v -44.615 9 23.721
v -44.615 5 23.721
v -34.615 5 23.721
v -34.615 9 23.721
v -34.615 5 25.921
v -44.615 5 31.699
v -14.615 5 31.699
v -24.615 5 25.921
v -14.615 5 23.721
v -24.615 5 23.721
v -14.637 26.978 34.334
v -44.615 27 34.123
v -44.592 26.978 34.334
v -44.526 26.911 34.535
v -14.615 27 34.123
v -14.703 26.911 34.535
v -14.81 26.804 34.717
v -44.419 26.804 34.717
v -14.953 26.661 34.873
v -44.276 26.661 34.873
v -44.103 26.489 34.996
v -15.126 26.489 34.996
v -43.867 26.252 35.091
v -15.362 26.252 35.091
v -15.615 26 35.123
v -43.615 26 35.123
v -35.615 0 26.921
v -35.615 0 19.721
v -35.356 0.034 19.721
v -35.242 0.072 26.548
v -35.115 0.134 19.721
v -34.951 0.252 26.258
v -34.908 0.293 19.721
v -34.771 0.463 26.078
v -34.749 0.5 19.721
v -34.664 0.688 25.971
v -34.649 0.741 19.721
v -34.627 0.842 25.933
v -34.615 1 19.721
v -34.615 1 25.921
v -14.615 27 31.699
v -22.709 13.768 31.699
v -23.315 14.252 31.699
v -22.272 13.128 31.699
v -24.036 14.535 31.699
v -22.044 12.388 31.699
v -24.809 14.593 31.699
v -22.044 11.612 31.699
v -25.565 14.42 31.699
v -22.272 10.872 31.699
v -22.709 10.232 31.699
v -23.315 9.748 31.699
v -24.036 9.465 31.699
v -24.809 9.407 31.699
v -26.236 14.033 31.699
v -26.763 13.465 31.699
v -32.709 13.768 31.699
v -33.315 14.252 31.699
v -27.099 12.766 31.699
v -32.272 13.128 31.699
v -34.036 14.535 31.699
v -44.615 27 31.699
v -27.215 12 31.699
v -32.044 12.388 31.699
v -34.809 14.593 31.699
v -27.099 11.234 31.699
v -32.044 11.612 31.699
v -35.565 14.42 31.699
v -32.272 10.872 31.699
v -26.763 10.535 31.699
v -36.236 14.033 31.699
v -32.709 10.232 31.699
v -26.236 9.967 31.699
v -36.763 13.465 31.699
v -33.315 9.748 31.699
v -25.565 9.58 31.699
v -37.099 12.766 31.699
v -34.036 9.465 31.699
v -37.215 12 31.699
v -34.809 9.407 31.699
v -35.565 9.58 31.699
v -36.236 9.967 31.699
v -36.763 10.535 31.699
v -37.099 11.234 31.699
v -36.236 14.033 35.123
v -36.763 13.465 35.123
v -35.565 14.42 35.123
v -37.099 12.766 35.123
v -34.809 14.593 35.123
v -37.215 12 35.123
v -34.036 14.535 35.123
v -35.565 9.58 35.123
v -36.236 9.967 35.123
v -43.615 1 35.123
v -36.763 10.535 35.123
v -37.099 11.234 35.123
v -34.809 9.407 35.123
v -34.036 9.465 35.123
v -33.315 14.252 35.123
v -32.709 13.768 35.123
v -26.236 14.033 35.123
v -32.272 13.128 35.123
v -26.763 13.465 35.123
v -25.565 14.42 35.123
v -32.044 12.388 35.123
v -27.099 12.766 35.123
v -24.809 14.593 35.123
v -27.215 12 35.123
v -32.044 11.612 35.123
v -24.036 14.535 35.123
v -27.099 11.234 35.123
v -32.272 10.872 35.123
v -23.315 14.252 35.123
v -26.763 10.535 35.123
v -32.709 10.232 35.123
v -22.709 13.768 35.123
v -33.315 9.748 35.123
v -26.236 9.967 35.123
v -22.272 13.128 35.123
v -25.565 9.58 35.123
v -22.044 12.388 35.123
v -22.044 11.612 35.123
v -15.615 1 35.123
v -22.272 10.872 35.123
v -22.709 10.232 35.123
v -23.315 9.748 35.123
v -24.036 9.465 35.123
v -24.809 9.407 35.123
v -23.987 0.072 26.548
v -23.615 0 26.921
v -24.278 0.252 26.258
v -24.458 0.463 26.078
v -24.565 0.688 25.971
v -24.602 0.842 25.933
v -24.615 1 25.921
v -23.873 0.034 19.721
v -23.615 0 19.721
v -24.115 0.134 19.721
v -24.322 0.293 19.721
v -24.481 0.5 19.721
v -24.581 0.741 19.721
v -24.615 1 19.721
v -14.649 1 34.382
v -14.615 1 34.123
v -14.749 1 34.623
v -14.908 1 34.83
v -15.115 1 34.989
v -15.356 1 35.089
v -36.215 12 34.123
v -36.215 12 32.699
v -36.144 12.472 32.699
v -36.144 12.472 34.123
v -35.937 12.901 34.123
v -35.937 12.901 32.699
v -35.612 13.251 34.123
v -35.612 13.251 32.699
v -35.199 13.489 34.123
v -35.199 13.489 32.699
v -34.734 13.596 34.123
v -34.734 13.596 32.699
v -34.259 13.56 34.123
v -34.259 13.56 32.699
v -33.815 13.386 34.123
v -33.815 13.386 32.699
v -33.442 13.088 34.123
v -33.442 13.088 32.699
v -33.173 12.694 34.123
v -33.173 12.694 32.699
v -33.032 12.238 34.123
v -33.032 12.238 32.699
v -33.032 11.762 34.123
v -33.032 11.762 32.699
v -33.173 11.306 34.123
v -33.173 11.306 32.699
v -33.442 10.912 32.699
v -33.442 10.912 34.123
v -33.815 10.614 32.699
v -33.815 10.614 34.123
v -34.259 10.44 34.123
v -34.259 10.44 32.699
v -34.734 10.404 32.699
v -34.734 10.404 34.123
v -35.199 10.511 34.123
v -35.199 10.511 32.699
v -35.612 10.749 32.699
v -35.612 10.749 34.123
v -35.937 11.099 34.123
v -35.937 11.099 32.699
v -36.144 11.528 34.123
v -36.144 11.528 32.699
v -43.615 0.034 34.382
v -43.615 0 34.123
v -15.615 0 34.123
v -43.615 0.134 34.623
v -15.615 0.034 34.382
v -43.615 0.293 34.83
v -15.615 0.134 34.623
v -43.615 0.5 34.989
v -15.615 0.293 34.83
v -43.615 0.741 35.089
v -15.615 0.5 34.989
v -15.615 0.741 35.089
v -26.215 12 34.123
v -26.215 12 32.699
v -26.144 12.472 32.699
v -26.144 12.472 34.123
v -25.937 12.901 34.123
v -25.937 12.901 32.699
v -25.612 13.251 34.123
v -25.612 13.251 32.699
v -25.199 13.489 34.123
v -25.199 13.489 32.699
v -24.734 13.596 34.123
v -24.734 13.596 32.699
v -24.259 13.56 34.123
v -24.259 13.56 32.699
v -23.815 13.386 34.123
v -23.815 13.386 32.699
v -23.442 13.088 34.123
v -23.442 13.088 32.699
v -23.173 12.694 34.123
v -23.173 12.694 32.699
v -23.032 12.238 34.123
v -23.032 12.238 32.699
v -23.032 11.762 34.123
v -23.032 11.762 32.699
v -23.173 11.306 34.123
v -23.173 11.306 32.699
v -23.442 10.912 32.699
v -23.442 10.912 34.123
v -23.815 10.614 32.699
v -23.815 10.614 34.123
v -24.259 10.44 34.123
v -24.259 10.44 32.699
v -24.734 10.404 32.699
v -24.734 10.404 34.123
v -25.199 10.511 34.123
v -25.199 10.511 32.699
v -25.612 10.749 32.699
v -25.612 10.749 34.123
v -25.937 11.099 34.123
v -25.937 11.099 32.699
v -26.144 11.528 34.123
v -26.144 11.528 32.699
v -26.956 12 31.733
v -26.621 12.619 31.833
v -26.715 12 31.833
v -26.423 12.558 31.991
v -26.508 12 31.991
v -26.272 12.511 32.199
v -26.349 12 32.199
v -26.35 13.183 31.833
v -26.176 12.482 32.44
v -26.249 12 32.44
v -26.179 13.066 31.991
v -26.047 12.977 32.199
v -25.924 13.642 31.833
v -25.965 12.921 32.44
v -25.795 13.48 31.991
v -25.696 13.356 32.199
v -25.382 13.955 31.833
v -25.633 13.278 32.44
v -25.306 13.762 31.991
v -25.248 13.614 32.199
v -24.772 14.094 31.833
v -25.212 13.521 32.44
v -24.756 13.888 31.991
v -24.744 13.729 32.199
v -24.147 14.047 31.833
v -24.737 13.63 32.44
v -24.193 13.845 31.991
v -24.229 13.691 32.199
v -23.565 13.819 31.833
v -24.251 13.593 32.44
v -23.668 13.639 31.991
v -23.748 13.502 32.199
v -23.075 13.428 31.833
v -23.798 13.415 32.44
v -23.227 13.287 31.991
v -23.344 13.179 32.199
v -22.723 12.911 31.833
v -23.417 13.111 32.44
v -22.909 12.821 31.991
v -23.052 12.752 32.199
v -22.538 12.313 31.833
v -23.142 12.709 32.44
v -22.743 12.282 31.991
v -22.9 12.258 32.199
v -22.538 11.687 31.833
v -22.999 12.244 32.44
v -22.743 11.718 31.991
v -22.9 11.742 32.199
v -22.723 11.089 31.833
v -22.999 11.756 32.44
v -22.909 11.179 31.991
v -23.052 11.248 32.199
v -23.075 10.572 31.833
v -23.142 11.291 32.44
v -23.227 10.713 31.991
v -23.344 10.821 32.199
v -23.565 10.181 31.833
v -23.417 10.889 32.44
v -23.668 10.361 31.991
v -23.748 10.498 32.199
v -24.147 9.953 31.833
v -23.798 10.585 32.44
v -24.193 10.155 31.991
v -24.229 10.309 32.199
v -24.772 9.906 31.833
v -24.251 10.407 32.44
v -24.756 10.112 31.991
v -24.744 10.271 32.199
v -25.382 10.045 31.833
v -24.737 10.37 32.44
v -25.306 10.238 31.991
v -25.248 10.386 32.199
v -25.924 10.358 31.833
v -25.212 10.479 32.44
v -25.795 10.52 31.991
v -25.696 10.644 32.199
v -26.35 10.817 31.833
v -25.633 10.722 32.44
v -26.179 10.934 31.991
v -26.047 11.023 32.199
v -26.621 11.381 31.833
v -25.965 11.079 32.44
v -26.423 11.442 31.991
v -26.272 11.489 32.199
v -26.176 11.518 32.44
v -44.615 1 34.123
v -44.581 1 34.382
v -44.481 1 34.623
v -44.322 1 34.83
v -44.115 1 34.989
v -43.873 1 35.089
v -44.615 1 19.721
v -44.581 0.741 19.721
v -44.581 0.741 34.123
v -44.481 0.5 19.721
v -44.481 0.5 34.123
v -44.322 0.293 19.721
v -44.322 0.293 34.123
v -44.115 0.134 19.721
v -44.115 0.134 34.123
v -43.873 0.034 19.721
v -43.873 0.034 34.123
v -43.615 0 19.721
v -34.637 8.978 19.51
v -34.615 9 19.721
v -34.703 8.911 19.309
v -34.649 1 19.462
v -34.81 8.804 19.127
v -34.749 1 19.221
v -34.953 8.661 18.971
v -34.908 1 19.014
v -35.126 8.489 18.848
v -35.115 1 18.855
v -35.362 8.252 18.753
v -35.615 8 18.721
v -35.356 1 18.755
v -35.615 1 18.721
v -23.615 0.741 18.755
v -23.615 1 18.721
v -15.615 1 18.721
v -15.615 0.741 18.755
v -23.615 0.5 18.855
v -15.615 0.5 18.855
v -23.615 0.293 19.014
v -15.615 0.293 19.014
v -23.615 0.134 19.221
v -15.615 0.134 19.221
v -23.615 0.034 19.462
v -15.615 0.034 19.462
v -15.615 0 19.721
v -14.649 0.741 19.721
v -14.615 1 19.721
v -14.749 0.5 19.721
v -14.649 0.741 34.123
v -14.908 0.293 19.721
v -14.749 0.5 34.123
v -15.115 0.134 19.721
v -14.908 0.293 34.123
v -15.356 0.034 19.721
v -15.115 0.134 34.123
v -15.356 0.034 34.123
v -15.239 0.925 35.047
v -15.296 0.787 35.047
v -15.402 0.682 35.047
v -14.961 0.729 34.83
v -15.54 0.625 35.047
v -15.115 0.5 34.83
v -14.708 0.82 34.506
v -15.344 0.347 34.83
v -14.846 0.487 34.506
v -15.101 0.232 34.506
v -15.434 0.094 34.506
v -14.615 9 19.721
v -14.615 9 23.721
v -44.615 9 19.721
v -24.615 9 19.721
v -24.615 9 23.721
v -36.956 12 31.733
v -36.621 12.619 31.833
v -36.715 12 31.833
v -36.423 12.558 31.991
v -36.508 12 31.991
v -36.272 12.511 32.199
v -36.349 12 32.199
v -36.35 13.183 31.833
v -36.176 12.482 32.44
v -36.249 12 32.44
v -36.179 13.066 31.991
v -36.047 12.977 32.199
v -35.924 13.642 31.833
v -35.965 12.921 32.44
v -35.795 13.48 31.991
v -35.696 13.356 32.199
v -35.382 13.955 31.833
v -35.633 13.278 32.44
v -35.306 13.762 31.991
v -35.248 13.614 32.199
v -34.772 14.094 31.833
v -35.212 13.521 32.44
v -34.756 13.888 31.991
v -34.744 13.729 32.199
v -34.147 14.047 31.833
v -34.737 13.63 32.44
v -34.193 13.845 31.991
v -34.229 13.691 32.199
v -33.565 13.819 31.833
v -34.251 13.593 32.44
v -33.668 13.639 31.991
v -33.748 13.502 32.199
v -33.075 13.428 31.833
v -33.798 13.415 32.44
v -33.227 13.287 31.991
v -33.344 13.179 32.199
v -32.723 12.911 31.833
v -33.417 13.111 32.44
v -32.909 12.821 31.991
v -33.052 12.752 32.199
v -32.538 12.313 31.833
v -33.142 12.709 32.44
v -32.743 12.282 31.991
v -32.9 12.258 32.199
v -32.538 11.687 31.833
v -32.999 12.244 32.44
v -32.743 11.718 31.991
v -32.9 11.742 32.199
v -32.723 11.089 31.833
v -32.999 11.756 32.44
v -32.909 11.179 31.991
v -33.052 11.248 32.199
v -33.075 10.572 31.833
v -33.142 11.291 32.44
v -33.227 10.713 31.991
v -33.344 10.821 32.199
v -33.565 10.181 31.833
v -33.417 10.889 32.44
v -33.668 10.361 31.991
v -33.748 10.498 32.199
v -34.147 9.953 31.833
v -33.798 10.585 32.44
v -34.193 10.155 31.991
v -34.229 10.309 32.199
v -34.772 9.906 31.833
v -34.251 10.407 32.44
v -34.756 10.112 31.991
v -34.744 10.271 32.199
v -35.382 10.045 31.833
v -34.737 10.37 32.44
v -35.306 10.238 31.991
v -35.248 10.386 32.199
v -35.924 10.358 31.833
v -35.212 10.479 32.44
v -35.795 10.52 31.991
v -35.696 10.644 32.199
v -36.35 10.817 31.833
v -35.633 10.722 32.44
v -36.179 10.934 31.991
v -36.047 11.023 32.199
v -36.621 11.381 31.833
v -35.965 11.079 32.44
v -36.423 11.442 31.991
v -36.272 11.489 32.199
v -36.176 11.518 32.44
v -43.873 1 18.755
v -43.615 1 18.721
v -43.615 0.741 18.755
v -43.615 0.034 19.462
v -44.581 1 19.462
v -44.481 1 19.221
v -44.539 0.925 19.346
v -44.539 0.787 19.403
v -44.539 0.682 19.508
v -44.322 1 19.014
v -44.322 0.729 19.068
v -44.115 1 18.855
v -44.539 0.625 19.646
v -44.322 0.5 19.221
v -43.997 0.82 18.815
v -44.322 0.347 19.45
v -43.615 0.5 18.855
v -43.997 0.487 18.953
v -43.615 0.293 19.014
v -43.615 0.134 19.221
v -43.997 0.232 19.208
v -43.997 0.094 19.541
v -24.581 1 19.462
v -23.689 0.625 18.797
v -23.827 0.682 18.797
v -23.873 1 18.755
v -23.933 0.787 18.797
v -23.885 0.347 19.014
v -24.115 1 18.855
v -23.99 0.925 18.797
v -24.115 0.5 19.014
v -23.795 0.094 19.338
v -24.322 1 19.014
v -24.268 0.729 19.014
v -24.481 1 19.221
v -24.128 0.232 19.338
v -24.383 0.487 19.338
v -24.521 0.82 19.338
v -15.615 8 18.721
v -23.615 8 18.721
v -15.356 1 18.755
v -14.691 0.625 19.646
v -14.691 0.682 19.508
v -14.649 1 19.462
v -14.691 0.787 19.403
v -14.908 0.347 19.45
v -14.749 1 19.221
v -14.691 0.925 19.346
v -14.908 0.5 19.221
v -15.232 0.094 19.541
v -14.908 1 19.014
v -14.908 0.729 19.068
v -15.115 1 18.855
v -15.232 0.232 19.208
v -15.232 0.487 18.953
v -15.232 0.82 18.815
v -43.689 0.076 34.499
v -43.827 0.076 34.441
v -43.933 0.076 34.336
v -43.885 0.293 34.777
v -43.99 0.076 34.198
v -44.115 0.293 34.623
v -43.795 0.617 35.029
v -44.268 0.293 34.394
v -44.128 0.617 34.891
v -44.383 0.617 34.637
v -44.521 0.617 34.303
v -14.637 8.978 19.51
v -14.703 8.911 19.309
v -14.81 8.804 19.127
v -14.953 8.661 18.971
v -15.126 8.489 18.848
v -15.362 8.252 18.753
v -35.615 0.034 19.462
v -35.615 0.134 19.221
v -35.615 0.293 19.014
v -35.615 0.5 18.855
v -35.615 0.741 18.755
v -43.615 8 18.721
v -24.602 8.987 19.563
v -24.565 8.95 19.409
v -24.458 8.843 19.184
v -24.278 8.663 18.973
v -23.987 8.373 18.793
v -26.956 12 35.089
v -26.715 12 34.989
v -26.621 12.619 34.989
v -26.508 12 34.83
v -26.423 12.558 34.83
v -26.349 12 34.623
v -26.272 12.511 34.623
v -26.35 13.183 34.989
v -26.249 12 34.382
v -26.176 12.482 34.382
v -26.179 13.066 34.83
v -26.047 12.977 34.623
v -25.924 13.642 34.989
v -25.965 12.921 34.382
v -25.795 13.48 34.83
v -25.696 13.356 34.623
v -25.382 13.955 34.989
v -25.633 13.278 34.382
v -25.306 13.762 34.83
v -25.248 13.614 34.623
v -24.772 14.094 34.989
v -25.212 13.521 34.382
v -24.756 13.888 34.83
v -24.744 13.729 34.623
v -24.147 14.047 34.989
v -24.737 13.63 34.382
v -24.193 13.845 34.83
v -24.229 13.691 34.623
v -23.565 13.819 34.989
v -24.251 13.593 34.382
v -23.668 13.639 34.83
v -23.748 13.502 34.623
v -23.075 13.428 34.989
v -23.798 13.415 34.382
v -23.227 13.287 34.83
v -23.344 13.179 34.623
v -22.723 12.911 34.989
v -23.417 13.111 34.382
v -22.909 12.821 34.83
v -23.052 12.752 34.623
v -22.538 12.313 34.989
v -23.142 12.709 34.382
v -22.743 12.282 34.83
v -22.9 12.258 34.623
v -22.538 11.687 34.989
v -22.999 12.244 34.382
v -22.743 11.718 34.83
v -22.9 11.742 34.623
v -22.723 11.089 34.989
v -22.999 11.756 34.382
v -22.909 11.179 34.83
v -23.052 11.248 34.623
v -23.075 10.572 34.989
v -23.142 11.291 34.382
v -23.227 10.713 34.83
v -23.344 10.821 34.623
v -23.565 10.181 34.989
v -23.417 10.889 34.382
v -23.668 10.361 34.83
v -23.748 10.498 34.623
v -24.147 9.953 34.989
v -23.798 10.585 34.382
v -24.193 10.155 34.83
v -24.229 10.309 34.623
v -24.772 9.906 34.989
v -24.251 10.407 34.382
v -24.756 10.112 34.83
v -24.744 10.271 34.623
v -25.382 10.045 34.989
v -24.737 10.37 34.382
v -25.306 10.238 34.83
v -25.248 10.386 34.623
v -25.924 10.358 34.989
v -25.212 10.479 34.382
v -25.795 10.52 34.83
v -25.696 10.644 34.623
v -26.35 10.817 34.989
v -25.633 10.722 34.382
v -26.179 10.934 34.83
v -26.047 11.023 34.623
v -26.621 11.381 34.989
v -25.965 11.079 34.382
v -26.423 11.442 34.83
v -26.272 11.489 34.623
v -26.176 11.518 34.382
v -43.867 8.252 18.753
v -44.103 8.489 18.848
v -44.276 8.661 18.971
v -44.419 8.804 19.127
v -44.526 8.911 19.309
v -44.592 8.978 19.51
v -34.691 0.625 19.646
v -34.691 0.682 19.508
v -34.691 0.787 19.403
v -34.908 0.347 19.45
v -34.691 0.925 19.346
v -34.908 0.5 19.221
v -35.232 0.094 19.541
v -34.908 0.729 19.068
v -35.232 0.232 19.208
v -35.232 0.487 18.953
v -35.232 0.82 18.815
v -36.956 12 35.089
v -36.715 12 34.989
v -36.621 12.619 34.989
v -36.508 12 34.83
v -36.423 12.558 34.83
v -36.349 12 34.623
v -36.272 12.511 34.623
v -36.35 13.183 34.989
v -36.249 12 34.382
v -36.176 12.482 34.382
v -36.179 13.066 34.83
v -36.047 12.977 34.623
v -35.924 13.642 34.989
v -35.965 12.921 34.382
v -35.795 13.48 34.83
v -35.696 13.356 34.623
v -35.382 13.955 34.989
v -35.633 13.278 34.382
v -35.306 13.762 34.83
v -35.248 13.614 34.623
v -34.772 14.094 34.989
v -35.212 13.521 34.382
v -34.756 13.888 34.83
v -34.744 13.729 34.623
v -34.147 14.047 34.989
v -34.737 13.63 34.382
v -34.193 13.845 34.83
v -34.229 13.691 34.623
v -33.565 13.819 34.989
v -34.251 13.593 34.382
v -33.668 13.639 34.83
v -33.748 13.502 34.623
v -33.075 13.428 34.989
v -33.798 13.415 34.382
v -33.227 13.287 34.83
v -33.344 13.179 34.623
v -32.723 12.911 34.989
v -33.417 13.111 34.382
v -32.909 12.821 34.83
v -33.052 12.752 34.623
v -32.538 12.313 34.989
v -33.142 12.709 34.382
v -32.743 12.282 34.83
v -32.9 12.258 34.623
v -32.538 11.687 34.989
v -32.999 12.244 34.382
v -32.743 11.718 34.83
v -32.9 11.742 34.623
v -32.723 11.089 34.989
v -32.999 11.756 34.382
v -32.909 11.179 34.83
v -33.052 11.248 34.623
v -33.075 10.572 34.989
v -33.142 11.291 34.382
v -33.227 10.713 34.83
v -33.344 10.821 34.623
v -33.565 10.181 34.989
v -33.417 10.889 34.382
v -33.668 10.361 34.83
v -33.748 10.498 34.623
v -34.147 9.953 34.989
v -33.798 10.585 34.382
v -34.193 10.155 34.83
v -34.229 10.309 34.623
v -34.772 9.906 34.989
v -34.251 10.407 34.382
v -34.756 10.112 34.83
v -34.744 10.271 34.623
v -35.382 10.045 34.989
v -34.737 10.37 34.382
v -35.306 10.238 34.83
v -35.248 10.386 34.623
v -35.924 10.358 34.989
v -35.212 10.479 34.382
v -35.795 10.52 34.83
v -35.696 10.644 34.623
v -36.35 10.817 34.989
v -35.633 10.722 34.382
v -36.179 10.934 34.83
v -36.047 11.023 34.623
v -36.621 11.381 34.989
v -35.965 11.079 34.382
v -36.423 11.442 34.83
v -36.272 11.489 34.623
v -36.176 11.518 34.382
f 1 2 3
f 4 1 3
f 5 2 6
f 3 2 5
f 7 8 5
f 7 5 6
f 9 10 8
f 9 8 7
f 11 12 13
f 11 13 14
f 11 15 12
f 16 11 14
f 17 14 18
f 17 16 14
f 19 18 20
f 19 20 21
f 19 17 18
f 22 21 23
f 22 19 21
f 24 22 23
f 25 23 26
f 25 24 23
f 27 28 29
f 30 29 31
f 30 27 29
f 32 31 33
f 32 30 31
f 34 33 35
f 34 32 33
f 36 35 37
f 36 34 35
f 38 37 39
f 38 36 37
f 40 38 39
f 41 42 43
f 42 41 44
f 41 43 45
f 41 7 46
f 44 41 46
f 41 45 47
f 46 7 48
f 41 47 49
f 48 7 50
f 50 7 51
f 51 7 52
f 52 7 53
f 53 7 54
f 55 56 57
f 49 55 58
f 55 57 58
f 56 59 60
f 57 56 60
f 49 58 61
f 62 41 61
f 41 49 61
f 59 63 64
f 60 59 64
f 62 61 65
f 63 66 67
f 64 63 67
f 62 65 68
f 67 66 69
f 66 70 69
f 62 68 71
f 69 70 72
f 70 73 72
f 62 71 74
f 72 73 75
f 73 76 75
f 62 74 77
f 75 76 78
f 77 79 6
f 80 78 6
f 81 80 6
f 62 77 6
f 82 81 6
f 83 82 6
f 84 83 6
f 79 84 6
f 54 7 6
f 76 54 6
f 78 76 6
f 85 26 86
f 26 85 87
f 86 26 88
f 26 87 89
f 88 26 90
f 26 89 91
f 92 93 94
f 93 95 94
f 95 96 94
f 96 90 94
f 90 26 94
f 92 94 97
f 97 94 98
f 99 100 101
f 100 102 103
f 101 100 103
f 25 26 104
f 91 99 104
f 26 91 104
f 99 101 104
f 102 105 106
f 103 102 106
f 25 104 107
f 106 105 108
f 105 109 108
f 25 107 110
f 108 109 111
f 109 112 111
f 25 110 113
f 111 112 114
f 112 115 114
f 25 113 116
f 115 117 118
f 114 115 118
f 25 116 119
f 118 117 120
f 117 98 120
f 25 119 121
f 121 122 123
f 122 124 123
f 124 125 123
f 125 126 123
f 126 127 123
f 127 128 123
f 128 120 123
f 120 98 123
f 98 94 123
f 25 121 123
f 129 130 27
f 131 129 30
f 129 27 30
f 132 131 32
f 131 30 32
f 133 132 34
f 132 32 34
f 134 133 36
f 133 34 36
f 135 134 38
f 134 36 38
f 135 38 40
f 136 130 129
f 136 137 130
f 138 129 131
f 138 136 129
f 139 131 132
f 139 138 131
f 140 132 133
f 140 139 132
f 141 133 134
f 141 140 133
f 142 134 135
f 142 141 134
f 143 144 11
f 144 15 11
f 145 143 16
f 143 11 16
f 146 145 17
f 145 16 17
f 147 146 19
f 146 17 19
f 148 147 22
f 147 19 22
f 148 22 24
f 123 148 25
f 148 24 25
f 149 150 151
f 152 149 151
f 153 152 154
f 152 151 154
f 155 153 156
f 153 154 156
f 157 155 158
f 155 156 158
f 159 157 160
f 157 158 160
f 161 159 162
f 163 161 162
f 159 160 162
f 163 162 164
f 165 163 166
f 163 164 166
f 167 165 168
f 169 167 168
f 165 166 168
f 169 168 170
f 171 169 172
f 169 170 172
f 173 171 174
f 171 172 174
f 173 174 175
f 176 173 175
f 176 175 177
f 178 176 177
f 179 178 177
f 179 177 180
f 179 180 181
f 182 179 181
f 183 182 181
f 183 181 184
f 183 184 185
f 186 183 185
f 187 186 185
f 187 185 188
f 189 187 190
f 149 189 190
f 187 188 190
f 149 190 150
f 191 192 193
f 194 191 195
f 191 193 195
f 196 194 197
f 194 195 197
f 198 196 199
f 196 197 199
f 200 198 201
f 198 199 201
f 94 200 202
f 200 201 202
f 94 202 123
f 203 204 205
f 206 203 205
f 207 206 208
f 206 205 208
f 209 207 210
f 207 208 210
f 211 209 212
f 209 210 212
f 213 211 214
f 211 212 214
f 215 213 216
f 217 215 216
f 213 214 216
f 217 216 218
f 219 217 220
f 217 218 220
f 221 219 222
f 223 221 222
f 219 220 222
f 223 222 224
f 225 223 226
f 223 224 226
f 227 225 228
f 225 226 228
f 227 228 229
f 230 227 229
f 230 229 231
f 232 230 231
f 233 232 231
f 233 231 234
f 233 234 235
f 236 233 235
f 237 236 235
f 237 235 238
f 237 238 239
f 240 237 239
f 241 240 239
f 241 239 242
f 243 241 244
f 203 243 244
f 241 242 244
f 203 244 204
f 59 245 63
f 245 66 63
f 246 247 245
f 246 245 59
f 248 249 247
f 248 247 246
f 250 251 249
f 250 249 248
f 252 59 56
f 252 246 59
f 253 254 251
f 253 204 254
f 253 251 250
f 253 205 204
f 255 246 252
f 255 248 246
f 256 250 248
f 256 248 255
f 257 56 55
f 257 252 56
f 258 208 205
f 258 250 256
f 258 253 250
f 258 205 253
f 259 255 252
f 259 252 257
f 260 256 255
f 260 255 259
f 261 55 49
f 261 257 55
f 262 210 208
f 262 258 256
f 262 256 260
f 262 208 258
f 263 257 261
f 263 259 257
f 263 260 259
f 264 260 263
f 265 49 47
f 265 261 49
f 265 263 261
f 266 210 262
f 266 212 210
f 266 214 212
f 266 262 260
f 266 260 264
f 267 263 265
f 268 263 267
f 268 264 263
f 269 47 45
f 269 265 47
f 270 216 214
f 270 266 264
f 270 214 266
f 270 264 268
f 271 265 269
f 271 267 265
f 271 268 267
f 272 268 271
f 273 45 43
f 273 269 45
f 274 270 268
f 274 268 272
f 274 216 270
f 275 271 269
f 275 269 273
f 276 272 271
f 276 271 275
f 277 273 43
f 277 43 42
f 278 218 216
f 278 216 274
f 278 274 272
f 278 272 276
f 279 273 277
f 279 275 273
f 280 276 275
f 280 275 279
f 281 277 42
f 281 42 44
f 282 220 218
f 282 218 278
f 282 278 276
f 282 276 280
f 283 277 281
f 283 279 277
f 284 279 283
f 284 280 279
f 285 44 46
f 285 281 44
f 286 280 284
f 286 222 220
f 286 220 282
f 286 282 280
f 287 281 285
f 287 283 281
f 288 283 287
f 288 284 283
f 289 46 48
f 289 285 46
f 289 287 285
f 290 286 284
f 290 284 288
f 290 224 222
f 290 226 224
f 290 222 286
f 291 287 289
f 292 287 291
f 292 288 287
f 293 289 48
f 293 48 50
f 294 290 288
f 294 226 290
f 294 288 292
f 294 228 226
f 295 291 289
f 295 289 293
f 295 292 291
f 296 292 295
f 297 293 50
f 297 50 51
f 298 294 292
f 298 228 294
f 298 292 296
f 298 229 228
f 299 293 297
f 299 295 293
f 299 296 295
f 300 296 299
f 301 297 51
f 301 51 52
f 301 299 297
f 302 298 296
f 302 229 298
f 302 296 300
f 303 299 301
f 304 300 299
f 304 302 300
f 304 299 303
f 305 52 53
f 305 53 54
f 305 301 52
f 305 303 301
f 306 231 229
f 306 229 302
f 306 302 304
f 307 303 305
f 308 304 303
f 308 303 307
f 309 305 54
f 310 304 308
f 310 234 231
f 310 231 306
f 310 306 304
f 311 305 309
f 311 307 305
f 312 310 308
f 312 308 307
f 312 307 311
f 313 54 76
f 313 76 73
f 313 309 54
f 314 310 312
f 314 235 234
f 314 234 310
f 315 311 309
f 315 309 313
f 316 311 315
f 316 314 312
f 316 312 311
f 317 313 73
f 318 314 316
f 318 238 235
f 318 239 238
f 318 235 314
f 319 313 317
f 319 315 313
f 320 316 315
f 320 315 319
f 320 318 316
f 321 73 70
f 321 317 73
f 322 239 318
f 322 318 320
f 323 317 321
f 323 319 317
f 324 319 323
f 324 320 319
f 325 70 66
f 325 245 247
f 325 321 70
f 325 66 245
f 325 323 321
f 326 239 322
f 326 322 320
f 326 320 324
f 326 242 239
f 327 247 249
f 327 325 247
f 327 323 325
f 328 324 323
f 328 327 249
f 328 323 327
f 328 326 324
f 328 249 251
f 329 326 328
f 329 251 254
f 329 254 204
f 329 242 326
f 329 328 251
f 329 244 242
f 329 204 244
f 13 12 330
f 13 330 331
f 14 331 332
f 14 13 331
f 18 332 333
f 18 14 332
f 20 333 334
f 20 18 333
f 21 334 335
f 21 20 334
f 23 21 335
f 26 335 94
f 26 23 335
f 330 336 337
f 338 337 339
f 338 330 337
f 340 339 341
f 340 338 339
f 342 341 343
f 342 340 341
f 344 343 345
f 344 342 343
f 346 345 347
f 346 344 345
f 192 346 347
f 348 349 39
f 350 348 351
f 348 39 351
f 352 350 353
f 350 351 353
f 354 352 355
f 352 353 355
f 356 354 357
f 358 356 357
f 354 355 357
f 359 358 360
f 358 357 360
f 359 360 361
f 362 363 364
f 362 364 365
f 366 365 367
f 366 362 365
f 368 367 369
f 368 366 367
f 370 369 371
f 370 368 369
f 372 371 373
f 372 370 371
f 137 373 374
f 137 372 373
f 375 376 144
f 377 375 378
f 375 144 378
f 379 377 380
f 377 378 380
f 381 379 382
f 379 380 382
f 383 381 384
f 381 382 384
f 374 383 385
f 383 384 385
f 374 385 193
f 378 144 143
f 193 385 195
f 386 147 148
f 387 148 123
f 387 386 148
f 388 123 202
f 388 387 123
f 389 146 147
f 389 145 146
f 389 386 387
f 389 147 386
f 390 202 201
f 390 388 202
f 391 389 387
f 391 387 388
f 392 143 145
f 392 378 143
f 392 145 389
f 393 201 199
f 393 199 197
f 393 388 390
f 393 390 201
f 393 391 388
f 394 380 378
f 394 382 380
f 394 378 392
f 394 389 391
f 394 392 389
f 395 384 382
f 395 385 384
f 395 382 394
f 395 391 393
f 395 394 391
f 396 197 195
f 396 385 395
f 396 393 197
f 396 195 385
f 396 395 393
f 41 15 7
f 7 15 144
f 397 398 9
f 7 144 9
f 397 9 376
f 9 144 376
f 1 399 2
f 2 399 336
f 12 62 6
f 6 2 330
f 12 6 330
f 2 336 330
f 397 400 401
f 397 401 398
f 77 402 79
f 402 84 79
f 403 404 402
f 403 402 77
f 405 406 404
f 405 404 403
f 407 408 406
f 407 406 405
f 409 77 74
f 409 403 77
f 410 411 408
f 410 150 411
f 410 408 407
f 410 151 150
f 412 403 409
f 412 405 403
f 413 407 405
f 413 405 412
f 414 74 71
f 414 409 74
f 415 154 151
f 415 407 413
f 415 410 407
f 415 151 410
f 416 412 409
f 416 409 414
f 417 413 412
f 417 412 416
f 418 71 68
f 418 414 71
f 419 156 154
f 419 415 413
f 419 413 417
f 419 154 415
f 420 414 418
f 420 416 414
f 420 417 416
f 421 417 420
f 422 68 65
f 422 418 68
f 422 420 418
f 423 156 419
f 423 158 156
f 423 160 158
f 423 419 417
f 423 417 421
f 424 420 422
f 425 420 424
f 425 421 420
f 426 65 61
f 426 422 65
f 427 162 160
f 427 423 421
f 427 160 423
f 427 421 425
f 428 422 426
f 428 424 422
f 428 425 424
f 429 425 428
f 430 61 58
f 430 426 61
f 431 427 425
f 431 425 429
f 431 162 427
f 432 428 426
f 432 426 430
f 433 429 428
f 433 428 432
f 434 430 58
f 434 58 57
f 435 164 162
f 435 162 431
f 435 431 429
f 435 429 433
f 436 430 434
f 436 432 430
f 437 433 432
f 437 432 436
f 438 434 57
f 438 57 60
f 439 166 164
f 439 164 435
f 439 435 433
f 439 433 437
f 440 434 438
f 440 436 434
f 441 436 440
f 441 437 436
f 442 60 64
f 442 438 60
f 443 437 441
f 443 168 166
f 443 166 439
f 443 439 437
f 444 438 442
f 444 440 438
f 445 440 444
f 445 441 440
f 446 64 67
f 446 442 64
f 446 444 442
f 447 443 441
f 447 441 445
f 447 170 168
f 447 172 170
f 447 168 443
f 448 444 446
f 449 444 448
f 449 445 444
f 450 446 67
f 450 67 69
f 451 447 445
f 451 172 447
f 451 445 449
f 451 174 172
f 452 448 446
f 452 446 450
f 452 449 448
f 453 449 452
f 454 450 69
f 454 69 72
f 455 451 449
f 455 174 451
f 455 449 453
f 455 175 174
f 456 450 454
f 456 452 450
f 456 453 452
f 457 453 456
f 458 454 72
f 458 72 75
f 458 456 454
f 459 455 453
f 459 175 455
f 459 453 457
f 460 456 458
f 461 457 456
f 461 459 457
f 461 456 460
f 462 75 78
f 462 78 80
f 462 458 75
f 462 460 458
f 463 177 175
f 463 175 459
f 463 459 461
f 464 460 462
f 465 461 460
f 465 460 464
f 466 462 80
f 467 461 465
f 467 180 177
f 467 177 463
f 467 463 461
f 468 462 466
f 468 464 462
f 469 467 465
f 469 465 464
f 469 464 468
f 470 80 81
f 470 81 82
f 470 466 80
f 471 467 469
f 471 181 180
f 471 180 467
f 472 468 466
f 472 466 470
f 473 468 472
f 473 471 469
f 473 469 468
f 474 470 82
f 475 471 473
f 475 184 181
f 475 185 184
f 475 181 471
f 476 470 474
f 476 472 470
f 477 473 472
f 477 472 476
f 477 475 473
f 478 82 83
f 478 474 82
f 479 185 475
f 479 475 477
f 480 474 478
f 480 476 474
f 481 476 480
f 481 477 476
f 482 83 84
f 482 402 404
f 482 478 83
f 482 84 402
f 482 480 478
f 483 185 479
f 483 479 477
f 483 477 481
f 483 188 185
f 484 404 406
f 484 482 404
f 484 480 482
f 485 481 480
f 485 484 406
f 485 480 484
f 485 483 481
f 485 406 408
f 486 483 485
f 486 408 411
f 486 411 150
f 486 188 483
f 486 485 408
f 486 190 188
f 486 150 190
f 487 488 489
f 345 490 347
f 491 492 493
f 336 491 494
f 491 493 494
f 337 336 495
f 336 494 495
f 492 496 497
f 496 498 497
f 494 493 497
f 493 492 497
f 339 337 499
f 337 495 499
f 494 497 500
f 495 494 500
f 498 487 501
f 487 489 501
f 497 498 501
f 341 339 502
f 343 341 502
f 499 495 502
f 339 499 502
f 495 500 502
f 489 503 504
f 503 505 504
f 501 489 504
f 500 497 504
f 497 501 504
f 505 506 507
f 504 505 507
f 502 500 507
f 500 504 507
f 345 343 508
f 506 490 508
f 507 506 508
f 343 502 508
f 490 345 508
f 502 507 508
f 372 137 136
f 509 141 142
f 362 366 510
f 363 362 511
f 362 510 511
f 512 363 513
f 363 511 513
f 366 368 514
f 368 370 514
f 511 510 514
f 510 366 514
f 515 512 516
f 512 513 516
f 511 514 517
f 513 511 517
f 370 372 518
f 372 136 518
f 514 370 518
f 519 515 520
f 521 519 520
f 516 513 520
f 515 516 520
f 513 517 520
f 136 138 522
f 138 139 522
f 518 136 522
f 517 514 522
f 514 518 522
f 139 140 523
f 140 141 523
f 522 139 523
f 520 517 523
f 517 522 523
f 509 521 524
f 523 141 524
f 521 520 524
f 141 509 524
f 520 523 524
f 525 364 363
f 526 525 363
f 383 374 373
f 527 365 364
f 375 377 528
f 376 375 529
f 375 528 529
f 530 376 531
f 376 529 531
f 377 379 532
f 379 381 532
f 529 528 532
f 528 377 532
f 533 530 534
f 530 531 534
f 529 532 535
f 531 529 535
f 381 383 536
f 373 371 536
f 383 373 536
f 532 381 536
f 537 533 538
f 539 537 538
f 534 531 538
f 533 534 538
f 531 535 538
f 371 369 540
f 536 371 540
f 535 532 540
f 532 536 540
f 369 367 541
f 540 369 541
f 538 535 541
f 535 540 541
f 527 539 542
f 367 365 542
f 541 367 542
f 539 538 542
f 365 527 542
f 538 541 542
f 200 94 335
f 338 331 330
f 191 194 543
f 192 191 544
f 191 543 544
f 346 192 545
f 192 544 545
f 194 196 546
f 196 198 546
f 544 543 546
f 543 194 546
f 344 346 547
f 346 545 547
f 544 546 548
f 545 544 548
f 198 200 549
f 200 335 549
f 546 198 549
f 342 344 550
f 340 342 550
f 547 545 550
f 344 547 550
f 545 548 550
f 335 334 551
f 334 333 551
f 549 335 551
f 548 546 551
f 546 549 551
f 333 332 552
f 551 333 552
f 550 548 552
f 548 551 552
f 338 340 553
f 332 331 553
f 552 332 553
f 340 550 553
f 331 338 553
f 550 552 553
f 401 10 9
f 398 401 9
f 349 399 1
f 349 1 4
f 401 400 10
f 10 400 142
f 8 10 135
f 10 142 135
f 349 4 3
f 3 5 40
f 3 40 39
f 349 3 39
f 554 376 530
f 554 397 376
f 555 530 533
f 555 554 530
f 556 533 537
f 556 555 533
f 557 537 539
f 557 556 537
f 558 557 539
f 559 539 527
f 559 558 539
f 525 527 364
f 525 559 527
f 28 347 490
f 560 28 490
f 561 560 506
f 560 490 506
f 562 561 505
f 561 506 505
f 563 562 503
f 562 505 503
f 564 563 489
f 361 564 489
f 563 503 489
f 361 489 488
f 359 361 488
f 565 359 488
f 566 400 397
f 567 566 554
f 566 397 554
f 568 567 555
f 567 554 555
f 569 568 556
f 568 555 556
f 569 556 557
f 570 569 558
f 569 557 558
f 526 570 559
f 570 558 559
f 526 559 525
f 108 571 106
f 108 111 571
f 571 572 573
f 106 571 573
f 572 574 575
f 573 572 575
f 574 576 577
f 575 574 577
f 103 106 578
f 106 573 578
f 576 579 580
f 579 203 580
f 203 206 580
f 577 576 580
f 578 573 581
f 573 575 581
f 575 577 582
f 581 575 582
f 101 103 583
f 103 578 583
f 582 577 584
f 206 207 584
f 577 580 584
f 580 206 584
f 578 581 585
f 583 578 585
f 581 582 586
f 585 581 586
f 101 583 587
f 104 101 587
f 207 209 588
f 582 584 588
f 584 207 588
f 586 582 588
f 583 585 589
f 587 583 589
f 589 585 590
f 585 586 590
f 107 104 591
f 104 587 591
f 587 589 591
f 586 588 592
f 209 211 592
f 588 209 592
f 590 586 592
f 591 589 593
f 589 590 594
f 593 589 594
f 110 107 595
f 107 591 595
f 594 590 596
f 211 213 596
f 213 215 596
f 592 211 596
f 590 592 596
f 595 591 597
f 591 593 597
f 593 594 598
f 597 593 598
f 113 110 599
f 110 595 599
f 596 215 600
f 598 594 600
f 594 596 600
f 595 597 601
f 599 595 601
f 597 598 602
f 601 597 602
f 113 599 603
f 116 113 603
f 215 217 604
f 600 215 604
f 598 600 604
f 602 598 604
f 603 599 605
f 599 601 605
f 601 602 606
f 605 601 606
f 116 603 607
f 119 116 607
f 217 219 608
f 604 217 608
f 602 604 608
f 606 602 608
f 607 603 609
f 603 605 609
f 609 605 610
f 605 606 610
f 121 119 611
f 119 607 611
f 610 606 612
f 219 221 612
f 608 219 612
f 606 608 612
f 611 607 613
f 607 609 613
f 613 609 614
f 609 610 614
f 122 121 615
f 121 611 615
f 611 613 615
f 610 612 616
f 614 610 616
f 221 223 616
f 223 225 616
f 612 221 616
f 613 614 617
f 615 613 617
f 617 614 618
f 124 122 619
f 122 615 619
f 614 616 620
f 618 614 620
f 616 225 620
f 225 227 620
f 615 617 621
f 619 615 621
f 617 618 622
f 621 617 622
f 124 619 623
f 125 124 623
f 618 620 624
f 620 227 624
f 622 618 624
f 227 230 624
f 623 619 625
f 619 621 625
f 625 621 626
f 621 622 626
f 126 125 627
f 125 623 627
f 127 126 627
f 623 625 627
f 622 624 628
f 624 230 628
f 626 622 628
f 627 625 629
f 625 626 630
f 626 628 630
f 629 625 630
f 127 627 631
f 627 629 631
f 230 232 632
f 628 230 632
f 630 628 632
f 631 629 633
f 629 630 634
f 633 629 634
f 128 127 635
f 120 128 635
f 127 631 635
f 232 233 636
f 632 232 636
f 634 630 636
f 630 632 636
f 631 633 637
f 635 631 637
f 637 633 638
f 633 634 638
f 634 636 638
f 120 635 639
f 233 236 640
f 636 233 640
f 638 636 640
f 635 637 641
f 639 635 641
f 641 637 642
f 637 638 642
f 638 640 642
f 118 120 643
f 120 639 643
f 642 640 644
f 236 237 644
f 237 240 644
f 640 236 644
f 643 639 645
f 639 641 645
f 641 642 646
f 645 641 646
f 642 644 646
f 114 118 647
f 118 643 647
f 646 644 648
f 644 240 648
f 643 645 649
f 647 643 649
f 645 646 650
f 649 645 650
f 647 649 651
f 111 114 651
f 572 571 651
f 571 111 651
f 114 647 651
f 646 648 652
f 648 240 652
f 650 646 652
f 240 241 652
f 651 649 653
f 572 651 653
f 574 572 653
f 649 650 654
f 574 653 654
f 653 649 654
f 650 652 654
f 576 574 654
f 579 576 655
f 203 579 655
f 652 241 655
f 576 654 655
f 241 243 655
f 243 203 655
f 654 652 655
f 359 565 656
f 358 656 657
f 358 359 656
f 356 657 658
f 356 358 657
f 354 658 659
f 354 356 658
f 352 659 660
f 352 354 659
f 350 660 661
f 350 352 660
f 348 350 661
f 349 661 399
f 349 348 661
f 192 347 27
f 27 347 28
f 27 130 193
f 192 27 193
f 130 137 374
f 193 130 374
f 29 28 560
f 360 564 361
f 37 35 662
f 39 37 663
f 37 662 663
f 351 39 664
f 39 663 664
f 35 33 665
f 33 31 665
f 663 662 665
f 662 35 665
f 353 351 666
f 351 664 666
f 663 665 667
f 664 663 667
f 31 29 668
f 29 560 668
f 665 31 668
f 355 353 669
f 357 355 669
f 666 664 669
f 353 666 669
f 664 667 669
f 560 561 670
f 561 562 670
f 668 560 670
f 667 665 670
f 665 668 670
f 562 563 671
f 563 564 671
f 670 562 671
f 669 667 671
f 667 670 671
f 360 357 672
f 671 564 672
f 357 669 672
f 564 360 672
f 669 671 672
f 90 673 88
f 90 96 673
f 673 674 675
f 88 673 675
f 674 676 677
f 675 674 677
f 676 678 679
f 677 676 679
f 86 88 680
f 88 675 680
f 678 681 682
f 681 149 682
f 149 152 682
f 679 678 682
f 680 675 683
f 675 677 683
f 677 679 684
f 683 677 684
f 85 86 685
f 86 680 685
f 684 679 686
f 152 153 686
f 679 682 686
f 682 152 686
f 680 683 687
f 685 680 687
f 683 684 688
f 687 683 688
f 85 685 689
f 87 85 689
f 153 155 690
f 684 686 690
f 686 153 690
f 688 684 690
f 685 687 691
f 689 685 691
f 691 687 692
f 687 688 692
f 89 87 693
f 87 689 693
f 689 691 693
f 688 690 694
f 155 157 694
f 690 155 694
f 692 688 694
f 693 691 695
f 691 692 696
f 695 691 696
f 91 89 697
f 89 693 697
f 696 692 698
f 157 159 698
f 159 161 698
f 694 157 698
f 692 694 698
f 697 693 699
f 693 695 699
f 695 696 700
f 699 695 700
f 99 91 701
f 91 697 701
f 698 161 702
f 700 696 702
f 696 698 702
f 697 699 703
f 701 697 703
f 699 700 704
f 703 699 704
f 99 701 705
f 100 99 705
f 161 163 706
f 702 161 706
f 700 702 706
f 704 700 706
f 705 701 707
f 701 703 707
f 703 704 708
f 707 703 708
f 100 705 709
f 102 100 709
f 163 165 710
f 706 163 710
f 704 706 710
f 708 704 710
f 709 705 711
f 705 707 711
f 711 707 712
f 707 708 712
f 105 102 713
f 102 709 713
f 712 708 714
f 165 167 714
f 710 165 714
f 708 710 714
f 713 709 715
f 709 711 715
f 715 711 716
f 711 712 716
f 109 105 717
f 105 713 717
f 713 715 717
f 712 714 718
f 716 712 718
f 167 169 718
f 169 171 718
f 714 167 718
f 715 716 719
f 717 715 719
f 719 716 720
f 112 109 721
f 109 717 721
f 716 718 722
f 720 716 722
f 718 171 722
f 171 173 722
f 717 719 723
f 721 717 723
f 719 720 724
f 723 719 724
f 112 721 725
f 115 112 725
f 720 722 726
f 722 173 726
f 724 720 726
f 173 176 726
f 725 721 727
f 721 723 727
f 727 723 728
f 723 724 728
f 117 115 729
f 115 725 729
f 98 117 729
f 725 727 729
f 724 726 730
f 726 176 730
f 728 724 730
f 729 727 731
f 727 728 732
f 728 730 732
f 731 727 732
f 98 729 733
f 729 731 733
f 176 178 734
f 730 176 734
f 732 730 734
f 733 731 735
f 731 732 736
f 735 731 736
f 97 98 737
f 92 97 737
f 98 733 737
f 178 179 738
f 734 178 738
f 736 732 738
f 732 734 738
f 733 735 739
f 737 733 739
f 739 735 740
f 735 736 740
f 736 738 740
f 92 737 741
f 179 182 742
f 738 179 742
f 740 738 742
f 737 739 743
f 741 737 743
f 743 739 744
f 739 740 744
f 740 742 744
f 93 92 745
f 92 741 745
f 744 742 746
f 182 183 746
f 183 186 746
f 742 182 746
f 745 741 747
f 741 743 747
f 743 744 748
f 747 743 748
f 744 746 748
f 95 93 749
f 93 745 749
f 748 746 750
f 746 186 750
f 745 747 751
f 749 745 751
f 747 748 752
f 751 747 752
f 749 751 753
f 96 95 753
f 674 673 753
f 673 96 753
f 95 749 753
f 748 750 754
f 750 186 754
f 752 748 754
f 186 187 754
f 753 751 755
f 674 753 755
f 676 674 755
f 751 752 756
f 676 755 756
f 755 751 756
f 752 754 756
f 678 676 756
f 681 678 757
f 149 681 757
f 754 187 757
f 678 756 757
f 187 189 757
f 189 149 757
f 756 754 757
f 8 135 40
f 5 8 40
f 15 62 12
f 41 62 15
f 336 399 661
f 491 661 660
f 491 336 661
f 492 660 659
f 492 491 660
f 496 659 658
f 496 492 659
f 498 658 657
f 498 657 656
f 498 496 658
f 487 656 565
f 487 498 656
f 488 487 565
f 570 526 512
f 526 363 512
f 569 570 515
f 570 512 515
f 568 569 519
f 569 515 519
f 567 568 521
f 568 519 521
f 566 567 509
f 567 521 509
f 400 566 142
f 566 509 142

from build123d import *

# Parameters (mm, degrees)
BOSS_EXTRUDE1_DEPTH = 5
SKETCH1_3_W         = 10
SKETCH1_3_H         = 5
BOSS_EXTRUDE2_DEPTH = 9
BOSS_EXTRUDE3_DEPTH = 22
SKETCH4_R           = 1.6
CUT_EXTRUDE1_DEPTH  = 3.424711692
FILLET1_R           = 1
FILLET2_R           = 1


with BuildPart() as part:
    # Sketch1 → Boss-Extrude1 (new body)
    with BuildSketch(Plane(origin=(0, 0, 0), x_dir=(1, 0, 0), z_dir=(0, 1, 0))):
        Polygon((-44.61462686, -35.123247006), (-14.61462686, -35.123247006), (-14.61462686, -18.720861087), (-24.61462686, -18.720861087), (-24.61462686, -25.920861087), (-34.61462686, -25.920861087), (-34.61462686, -18.720861087), (-44.61462686, -18.720861087), align=None)
    extrude(amount=BOSS_EXTRUDE1_DEPTH)

    # Sketch1<3> → Boss-Extrude2 (add)
    with BuildSketch(Plane(origin=(0, 0, 0), x_dir=(1, 0, 0), z_dir=(0, 1, 0))):
        with Locations((-39.61462686, -21.220861087)):
            Rectangle(SKETCH1_3_W, SKETCH1_3_H)
        with Locations((-19.61462686, -21.220861087)):
            Rectangle(SKETCH1_3_W, SKETCH1_3_H)
    extrude(amount=BOSS_EXTRUDE2_DEPTH)

    # Sketch3 → Boss-Extrude3 (add)
    with BuildSketch(Plane(origin=(0, 5, 0), x_dir=(1, 0, 0), z_dir=(0, 1, 0))):
        Polygon((-34.61462686, -31.698535314), (-44.61462686, -31.698535314), (-44.61462686, -35.123247006), (-14.61462686, -35.123247006), (-14.61462686, -31.698535314), align=None)
    extrude(amount=BOSS_EXTRUDE3_DEPTH)

    # Sketch4 → Cut-Extrude1 (cut)
    with BuildSketch(Plane(origin=(0, 0, 31.698535314), x_dir=(-1, 0, 0), z_dir=(0, 0, -1))):
        with Locations((34.61462686, 12)):
            Circle(SKETCH4_R)
        with Locations((24.61462686, 12)):
            Circle(SKETCH4_R)
    extrude(amount=-CUT_EXTRUDE1_DEPTH, mode=Mode.SUBTRACT)

    # Fillet1
    fillet1_edges = [part.edges().sort_by_distance(p)[0] for p in [
        (-33.01462686, 12, 31.698535314),
        (-33.01462686, 12, 35.123247006),
        (-23.01462686, 12, 31.698535314),
        (-23.01462686, 12, 35.123247006),
    ]]
    fillet(fillet1_edges, radius=FILLET1_R)

    # Fillet2
    fillet2_edges = [part.edges().sort_by_distance(p)[0] for p in [
        (-39.61462686, 0, 18.720861087),
        (-34.61462686, 0, 22.320861087),
        (-29.61462686, 0, 25.920861087),
        (-24.61462686, 0, 22.320861087),
        (-19.61462686, 0, 18.720861087),
        (-14.61462686, 0, 26.922054046),
        (-14.61462686, 13.5, 35.123247006),
        (-44.61462686, 13.5, 35.123247006),
        (-44.61462686, 4.5, 18.720861087),
        (-34.61462686, 4.5, 18.720861087),
        (-24.61462686, 4.5, 18.720861087),
        (-14.61462686, 4.5, 18.720861087),
        (-39.61462686, 9, 18.720861087),
        (-19.61462686, 9, 18.720861087),
        (-29.61462686, 27, 35.123247006),
        (-29.61462686, 0, 35.123247006),
        (-44.61462686, 0, 26.922054046),
    ]]
    fillet(fillet2_edges, radius=FILLET2_R)


solid = part.part
